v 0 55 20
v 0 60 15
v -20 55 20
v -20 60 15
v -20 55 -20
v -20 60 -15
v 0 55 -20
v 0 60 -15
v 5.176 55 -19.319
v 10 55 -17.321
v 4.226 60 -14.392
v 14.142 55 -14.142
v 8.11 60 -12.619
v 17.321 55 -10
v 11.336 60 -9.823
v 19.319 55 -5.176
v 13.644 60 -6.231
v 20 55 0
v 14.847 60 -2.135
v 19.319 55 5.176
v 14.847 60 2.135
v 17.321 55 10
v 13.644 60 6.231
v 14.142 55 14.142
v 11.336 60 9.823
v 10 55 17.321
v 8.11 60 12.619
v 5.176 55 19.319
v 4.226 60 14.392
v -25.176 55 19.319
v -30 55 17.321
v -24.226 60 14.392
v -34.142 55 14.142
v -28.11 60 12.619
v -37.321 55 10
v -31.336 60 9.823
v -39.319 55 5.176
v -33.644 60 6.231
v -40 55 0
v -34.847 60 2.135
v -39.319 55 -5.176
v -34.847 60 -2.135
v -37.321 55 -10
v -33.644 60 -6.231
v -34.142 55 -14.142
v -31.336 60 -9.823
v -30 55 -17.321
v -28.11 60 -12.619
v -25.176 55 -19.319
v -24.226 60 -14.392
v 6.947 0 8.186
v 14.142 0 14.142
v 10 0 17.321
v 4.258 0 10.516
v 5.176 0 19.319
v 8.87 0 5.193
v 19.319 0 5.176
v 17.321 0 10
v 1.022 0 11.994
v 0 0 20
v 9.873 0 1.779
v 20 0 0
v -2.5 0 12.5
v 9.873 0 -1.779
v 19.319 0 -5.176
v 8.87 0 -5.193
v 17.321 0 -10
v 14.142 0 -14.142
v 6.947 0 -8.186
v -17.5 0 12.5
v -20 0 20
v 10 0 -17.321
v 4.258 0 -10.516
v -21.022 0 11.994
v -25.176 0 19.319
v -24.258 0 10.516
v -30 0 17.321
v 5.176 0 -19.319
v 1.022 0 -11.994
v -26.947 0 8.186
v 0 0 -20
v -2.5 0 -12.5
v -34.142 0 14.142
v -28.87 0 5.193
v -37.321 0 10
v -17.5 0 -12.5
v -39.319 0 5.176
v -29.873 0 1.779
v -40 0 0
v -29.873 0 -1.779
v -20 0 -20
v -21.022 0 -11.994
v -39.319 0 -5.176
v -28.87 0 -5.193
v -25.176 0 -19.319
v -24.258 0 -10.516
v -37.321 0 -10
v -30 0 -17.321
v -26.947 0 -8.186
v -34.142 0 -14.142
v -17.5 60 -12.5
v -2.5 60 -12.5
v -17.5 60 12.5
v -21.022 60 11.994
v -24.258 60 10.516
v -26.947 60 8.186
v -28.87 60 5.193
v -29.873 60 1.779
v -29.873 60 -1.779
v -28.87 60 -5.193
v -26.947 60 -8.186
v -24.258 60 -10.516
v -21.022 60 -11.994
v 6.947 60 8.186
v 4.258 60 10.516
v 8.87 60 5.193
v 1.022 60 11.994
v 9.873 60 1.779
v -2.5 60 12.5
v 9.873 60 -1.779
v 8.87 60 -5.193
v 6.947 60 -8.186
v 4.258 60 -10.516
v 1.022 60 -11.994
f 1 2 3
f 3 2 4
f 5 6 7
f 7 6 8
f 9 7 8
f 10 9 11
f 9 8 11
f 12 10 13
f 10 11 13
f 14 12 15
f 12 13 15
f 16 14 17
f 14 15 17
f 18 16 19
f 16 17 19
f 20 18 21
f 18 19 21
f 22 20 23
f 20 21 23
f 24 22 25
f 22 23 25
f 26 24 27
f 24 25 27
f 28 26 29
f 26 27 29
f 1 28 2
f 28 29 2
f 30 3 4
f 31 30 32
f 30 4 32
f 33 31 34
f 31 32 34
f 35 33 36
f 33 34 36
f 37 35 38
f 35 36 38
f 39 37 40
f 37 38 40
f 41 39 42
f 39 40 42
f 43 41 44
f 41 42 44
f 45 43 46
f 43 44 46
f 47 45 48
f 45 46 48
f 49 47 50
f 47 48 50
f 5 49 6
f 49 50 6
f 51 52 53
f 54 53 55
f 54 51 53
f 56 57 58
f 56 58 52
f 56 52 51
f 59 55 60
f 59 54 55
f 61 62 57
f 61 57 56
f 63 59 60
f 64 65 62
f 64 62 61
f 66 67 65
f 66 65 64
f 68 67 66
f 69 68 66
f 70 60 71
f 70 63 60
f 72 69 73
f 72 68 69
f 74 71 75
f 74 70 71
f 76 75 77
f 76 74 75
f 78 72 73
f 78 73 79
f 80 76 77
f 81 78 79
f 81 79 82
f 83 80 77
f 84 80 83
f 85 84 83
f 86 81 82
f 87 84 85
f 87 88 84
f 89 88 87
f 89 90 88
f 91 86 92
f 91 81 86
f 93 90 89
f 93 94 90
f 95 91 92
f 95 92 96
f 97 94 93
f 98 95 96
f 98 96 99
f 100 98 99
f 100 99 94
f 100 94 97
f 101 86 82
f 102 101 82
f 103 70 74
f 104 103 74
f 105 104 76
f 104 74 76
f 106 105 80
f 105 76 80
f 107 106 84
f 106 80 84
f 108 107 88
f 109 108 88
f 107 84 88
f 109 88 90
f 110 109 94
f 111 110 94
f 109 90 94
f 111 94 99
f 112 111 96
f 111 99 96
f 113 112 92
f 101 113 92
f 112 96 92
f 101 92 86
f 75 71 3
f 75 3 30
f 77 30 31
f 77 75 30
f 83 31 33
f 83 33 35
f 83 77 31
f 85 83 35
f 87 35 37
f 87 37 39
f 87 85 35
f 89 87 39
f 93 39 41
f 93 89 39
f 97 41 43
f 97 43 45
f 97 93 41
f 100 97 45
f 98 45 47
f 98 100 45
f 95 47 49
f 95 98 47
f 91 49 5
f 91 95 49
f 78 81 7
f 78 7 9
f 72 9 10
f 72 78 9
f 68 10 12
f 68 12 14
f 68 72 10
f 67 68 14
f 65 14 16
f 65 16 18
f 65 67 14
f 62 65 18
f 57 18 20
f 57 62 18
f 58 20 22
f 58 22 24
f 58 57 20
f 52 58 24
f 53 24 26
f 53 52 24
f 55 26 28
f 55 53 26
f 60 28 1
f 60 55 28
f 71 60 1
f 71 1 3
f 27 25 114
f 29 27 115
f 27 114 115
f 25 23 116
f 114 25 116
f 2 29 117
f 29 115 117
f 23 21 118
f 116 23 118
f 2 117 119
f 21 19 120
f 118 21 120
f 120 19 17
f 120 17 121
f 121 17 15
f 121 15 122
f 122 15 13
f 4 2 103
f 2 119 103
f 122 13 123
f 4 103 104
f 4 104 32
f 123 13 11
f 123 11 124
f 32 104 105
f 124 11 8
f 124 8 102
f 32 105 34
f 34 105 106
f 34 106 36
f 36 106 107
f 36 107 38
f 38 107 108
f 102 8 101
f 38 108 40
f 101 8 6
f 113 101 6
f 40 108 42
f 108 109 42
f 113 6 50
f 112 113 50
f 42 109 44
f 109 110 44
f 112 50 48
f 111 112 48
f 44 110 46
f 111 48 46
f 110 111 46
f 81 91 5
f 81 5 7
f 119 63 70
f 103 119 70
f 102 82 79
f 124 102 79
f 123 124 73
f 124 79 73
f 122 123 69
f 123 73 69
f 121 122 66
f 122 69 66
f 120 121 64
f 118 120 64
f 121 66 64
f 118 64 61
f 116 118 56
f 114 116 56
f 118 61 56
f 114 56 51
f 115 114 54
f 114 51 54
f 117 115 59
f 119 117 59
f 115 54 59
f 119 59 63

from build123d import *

# Parameters (mm, degrees)
SALIENTE_EXTRUIR1_DEPTH = 60
CHAFL_N1_SIZE           = 5


with BuildPart() as part:
    # Croquis1 → Saliente-Extruir1 (new body)
    with BuildSketch(Plane(origin=(0, 0, 0), x_dir=(1, 0, 0), z_dir=(0, 1, 0))):
        with BuildLine():
            Line((0, -20), (-20, -20))
            ThreePointArc((-20, -20), (-40, 0), (-20, 20))
            Line((-20, 20), (0, 20))
            ThreePointArc((0, 20), (20, 0), (0, -20))
        make_face()
        with BuildLine():
            Line((-2.5, -12.5), (-17.5, -12.5))
            ThreePointArc((-17.5, -12.5), (-30, 0), (-17.5, 12.5))
            Line((-17.5, 12.5), (-2.5, 12.5))
            ThreePointArc((-2.5, 12.5), (10, 0), (-2.5, -12.5))
        make_face(mode=Mode.SUBTRACT)
    extrude(amount=SALIENTE_EXTRUIR1_DEPTH)

    # Chaflán1
    chafl_n1_edges = [part.edges().sort_by_distance(p)[0] for p in [
        (-40, 60, 0),
        (-10, 60, 20),
        (20, 60, 0),
        (-10, 60, -20),
    ]]
    chamfer(chafl_n1_edges, length=CHAFL_N1_SIZE)


solid = part.part
